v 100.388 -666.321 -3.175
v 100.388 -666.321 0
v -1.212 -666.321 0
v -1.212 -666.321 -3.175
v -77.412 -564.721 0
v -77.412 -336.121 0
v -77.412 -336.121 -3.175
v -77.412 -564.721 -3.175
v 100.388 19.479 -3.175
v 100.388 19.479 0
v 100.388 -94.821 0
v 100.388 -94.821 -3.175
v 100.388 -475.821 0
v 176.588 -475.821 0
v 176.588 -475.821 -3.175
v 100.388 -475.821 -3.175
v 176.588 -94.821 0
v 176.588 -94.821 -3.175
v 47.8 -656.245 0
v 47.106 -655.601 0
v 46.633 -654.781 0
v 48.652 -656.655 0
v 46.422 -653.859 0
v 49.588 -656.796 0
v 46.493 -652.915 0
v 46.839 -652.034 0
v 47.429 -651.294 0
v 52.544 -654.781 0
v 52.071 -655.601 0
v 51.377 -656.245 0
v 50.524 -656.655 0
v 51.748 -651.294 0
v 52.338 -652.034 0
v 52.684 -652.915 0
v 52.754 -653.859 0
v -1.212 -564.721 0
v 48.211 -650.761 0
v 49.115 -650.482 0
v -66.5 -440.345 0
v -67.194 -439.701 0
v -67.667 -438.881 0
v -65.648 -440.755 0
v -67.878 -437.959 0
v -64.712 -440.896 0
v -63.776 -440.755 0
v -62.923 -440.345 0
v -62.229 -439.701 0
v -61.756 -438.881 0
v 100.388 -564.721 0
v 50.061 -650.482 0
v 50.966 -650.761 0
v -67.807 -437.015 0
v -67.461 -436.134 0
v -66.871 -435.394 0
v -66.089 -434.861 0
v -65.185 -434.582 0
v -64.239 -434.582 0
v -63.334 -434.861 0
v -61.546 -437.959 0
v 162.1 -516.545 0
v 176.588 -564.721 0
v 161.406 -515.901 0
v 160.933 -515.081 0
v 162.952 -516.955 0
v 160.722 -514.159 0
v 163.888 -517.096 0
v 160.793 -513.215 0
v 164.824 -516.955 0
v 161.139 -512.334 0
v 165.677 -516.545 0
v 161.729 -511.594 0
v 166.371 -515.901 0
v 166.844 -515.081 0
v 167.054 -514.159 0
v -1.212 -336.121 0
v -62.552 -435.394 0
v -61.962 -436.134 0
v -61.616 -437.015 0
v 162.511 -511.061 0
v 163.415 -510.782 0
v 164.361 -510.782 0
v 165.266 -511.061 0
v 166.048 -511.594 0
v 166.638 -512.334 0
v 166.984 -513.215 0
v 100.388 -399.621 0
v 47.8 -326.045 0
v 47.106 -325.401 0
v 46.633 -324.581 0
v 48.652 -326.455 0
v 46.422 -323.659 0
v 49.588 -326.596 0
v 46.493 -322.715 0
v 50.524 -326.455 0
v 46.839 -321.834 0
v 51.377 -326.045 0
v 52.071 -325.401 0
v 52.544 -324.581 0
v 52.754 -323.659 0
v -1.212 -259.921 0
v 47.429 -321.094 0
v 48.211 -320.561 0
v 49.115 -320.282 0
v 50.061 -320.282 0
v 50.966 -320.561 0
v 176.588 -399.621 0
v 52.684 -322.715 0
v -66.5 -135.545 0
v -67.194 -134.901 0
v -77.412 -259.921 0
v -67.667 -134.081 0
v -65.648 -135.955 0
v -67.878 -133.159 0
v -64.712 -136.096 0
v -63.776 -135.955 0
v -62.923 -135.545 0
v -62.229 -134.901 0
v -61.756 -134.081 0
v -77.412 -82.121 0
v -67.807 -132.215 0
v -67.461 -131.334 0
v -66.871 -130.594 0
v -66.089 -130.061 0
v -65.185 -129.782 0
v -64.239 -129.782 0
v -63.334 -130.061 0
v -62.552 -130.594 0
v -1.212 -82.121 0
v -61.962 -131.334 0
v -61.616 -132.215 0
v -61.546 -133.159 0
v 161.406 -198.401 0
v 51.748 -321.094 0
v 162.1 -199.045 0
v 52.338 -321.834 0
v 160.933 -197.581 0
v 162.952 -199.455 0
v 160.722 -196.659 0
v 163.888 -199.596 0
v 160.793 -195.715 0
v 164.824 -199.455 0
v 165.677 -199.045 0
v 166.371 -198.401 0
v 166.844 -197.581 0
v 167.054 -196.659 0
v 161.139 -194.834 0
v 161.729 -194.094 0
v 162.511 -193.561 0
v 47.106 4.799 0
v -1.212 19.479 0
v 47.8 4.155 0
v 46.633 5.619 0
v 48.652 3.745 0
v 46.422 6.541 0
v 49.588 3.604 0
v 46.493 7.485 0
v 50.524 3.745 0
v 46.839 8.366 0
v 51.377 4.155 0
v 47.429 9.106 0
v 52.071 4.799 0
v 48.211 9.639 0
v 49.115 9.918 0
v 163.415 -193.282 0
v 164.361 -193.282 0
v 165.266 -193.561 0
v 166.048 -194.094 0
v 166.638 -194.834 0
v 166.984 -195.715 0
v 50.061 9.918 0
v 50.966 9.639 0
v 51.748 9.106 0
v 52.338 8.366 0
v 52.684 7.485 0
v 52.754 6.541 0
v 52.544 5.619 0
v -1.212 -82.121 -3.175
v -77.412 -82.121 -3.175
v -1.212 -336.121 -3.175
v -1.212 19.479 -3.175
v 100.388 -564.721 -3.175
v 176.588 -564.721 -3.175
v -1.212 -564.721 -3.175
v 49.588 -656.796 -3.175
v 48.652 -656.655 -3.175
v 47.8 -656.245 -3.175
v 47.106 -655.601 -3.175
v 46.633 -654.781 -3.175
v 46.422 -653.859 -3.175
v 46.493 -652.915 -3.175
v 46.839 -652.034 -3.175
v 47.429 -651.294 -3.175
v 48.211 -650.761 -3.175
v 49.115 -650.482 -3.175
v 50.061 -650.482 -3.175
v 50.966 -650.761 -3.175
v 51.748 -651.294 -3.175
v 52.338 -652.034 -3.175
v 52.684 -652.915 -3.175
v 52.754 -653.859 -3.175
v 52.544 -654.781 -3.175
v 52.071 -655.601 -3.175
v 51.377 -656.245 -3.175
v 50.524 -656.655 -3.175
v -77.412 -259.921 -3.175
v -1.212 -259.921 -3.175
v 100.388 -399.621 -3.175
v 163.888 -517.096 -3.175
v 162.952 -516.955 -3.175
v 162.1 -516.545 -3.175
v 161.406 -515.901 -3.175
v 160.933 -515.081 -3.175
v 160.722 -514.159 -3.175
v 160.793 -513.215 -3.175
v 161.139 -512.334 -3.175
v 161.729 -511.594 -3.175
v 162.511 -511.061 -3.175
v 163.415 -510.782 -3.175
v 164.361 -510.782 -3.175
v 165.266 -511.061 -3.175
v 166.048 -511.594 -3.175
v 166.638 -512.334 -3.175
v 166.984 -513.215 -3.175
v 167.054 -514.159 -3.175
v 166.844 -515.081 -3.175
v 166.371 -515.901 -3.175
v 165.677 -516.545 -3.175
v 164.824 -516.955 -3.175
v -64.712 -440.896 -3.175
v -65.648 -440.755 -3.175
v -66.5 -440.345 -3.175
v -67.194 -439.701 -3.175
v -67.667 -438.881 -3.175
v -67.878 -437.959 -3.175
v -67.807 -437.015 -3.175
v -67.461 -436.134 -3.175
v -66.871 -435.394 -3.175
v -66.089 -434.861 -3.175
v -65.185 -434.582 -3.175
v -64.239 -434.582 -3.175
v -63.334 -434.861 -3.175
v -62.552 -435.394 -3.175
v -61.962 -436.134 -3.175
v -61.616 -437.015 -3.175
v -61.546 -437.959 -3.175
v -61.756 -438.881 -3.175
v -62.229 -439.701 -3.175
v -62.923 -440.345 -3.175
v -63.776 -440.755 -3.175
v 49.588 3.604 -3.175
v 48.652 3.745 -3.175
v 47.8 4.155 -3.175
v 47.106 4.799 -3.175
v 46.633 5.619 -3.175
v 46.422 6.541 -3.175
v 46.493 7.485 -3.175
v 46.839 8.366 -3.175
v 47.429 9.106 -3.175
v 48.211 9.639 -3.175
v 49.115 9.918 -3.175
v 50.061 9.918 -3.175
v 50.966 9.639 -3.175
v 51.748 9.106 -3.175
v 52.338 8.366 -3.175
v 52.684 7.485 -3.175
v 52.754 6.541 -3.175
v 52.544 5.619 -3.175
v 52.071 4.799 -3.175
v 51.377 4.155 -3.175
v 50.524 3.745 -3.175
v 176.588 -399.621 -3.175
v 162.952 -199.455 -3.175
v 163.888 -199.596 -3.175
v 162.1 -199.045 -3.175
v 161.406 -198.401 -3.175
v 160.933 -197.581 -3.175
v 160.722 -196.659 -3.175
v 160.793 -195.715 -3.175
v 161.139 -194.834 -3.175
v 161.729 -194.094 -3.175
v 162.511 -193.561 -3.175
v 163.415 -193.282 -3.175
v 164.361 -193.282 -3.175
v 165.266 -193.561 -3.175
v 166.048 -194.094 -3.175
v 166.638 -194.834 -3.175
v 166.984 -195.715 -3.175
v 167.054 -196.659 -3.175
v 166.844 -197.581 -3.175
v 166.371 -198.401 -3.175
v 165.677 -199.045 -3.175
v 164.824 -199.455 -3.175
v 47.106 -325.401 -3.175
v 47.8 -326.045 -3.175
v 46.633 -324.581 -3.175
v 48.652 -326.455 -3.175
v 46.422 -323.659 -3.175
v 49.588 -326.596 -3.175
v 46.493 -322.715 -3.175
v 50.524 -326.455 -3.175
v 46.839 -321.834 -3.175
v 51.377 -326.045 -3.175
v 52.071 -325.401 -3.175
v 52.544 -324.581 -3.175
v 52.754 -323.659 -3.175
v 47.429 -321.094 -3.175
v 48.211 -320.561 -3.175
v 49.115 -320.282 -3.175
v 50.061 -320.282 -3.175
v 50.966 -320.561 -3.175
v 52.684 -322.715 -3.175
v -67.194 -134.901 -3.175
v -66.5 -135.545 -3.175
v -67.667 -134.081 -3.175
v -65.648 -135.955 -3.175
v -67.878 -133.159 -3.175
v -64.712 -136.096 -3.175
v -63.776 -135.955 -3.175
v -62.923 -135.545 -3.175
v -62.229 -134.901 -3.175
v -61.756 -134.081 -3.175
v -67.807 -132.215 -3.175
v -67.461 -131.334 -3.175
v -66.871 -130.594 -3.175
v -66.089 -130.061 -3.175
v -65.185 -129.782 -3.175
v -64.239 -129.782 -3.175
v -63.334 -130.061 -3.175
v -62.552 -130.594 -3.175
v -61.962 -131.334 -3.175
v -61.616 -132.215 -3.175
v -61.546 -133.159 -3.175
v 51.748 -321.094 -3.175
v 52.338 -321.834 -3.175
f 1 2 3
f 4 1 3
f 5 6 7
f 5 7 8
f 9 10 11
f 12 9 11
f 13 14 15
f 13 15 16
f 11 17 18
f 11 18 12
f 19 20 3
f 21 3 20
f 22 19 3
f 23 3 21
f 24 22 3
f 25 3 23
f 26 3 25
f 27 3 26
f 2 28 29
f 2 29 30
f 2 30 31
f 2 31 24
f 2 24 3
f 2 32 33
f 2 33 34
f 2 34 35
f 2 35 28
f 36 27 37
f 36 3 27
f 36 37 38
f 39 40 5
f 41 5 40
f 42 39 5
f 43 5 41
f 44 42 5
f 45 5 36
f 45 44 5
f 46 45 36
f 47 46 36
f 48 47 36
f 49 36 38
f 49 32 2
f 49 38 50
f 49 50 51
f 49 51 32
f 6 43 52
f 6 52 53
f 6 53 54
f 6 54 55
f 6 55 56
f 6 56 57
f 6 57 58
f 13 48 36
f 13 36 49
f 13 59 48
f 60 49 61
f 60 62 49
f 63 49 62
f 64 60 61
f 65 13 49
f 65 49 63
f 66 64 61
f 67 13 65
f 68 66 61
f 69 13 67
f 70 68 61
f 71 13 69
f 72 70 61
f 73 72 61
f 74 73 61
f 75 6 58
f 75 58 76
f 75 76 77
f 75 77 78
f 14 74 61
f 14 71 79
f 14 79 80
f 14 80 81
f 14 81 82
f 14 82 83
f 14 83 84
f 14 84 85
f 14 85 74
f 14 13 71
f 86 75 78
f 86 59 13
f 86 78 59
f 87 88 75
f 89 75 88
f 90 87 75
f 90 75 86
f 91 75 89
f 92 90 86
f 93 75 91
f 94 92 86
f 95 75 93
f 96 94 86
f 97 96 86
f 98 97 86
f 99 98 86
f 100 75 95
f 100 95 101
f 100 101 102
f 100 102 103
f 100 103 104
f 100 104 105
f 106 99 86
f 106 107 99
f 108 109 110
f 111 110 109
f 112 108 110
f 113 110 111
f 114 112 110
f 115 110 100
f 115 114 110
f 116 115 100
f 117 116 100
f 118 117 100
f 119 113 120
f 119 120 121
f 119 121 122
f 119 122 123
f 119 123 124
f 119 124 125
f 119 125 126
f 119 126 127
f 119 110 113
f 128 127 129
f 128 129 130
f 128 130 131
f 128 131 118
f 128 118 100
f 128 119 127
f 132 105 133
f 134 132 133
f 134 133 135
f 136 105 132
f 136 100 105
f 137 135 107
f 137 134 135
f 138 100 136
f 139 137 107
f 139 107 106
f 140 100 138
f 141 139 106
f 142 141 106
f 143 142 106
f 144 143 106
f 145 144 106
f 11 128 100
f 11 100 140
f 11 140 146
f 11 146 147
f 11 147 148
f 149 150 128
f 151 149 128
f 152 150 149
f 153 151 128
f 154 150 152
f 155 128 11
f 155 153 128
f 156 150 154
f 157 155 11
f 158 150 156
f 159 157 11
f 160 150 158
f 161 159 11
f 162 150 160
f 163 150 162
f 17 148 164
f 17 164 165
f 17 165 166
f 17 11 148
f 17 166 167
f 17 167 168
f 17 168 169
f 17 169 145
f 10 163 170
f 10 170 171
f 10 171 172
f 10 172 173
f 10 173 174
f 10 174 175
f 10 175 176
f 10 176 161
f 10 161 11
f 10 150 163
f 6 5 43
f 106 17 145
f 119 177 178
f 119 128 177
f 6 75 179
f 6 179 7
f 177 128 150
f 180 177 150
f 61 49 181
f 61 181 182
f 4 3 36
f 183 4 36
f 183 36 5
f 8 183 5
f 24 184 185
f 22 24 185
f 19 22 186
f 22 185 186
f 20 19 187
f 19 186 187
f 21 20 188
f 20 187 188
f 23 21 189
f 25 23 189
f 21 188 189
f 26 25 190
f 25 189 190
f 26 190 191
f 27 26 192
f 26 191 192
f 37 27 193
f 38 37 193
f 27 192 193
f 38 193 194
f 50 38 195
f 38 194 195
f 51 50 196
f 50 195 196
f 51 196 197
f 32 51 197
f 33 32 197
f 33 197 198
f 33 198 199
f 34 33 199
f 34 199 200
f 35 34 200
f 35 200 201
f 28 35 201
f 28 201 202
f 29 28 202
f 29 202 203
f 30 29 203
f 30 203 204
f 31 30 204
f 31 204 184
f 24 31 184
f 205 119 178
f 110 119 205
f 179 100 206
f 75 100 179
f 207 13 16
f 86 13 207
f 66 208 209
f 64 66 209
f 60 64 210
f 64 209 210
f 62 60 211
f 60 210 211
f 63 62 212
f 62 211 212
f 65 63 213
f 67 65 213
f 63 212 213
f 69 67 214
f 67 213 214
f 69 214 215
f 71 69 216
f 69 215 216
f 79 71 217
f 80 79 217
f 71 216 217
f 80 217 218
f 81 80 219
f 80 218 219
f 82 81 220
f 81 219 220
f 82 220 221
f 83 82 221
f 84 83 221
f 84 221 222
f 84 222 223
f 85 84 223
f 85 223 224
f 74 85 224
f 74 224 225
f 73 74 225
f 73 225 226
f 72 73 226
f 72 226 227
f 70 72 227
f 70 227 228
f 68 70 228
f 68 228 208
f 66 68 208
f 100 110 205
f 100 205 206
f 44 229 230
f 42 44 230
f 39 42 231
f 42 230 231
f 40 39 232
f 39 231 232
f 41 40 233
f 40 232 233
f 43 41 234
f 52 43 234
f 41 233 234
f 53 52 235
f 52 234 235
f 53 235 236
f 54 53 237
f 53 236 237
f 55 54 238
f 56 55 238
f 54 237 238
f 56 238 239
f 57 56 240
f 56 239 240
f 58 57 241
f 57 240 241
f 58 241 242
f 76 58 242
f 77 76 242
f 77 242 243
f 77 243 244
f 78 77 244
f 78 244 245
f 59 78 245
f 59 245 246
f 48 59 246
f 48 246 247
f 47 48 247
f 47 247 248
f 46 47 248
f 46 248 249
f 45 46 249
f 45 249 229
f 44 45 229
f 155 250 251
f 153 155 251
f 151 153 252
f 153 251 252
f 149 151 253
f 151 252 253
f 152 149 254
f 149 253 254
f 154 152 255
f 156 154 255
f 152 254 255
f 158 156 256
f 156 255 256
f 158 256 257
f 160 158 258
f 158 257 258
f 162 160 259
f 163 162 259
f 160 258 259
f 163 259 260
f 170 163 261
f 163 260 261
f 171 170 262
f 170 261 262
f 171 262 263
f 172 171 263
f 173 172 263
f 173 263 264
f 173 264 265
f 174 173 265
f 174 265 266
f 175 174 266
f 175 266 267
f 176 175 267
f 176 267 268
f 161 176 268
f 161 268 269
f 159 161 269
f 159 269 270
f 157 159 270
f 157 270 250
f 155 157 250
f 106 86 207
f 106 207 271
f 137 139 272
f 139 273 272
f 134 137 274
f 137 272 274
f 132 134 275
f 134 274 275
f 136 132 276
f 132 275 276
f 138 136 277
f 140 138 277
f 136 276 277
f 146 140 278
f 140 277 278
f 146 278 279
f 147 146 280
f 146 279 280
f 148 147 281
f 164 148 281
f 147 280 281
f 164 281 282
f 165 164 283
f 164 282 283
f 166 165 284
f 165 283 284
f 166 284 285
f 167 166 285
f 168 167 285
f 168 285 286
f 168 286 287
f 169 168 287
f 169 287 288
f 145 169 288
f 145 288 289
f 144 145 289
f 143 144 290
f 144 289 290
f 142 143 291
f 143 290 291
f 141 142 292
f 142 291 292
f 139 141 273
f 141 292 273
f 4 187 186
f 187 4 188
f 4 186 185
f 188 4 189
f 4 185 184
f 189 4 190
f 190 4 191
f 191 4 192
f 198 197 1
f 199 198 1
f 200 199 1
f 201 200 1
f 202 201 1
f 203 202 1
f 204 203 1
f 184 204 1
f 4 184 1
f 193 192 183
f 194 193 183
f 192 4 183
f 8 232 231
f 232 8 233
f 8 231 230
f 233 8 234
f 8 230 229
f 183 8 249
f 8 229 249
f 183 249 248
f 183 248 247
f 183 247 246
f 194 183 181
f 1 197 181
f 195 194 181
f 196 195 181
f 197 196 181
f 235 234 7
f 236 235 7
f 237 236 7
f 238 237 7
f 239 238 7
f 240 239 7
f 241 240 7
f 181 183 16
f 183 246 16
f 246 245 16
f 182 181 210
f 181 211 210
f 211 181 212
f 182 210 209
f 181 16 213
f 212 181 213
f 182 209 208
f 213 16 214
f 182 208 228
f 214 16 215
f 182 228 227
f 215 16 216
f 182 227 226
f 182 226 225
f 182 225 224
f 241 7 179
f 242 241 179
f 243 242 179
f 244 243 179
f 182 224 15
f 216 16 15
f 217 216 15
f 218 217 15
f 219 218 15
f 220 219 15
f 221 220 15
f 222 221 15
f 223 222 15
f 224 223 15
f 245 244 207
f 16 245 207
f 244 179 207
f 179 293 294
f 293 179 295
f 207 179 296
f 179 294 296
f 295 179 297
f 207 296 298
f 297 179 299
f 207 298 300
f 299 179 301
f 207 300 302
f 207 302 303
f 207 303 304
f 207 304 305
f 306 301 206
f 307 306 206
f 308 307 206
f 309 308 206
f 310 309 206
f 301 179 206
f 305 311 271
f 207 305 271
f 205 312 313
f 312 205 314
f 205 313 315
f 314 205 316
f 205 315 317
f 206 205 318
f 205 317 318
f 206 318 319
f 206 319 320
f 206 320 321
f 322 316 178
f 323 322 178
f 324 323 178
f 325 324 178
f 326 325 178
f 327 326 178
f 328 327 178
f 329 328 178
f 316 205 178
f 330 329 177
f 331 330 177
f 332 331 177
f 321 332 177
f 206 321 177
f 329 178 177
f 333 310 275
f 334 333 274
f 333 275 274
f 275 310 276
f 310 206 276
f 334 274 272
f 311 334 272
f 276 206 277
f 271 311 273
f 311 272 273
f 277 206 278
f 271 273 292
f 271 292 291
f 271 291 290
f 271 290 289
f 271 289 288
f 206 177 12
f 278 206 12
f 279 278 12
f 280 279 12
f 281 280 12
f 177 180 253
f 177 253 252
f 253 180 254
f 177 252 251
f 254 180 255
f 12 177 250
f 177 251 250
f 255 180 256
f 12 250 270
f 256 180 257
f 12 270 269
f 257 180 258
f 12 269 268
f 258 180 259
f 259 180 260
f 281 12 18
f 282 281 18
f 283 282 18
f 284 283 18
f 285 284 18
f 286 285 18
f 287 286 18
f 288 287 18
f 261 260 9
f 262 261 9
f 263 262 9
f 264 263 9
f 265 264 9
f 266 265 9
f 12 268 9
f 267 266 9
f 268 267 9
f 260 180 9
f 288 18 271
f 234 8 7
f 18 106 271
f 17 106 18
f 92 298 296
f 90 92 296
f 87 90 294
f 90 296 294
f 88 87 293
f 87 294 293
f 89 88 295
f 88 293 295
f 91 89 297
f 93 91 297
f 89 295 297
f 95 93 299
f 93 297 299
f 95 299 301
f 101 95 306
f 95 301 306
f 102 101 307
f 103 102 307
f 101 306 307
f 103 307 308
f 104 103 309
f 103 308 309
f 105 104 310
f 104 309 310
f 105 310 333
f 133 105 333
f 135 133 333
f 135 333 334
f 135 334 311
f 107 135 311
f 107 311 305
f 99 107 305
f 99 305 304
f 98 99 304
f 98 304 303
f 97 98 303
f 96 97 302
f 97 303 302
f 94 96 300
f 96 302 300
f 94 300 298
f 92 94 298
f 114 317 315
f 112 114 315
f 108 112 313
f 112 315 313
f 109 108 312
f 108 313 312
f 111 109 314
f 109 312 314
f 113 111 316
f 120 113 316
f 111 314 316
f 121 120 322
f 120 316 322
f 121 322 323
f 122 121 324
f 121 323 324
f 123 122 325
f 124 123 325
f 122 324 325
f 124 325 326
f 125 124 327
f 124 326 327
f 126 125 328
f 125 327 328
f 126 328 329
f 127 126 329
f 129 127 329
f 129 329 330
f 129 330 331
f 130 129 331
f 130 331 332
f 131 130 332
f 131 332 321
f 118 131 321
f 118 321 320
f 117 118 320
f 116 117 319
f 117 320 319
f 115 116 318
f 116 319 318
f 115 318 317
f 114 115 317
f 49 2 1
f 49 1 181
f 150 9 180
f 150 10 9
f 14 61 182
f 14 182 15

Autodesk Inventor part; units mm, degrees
ref_plane "YZ Plane" through (0, 0, 0) normal (1, 0, 0) x (0, 1, 0)
ref_plane "XZ Plane" through (0, 0, 0) normal (0, 1, 0) x (-1, 0, 0)
ref_plane "XY Plane" through (0, 0, 0) normal (0, 0, 1) x (1, 0, 0)
sketch "Sketch1" plane through (0, 0, 0) normal (0, 0, 1) x (1, 0, 0)
  line L0 (176.5882, -640.9214) -> (176.5882, 349.6786)
  line L1 (-77.4118, 349.6786) -> (-77.4118, -640.9214)
  line L2 (100.3882, -640.9214) -> (100.3882, -564.7214)
  line L3 (100.3882, -564.7214) -> (176.5882, -564.7214)
  line L4 (176.5882, -475.8214) -> (100.3882, -475.8214)
  line L5 (100.3882, -475.8214) -> (100.3882, -399.6214)
  line L6 (100.3882, -399.6214) -> (176.5882, -399.6214)
  line L7 (176.5882, -399.6214) -> (176.5882, -475.8214)
  line L8 (176.5882, -94.8214) -> (100.3882, -94.8214)
  line L9 (176.5882, 70.2786) -> (176.5882, -94.8214)
  line L10 (-77.4118, 8.6504) -> (-77.4118, 88.2844)
  line L11 (-77.4118, -379.8866) -> (-77.4118, -294.668)
  line L12 (-77.4118, -640.9214) -> (-1.2118, -640.9214)
  line L13 (-1.2118, -640.9214) -> (-1.2118, -564.7214)
  line L14 (-1.2118, -564.7214) -> (-77.4118, -564.7214)
  line L15 (-77.4118, -564.7214) -> (-77.4118, -640.9214)
  line L16 (-77.4118, -259.9214) -> (-1.2118, -259.9214)
  line L17 (-1.2118, -259.9214) -> (-1.2118, -336.1214)
  line L18 (-1.2118, -336.1214) -> (-77.4118, -336.1214)
  line L19 (-77.4118, -336.1214) -> (-77.4118, -259.9214)
  line L20 (-1.2118, -82.1214) -> (-1.2118, 19.4786)
  line L21 (-77.4118, 19.4786) -> (-77.4118, 19.4786)
  line L22 (100.3882, -640.9214) -> (100.3882, -666.3214)
  line L23 (100.3882, -666.3214) -> (-1.2118, -666.3214)
  line L24 (-1.2118, -666.3214) -> (-1.2118, -640.9214)
  line L25 (-1.2118, -82.1214) -> (-77.4118, -82.1214)
  line L26 (100.3882, 19.4786) -> (100.3882, -94.8214)
  line L27 (100.3882, 19.4786) -> (-1.2118, 19.4786)
  point P0 (0, 0)
  point P1 (49.5882, -323.4214)
  point P2 (-64.7118, -437.7214)
  point P3 (-64.7118, -132.9214)
  point P4 (163.8882, -196.4214)
  point P5 (163.8882, -513.9214)
  point P6 (49.5882, -653.6214)
  point P7 (49.5882, 6.7786)
  dimension "d1" = 990.6
  dimension "d2" = 76.2
  dimension "d3" = 76.2
  dimension "d4" = 76.2
  dimension "d5" = 76.2
  dimension "d6" = 88.9
  dimension "d7" = 304.8
  dimension "d14" = 76.2
  dimension "d15" = 76.2
  dimension "d16" = 76.2
  dimension "d17" = 76.2
  dimension "d18" = 63.5
  dimension "d19" = 101.6
  dimension "d20" = 76.2
  dimension "d29" = 12.7
  dimension "d30" = 12.7
  dimension "d31" = 127
  dimension "d32" = 101.6
  dimension "d33" = 12.7
  dimension "d34" = 12.7
  dimension "d35" = 101.6
  dimension "d36" = 38.1
  dimension "d37" = 25.4
  dimension "d38" = 101.6
  dimension "d49" = 101.6
  dimension "d50" = 114.3
  dimension "d51" = 76.2
  dimension "d52" = 76.2
extrude "Extrusion1" add sketch "Sketch1" against normal blind 3.175 contours L3 L2 L22 L23 L24 L13 L14 L1 L18 L17 L16 L25 L20 L27 L26 L8 L0 L6 L5 L4
hole "Hole1" at (49.5882, -323.4214, 0) at (-64.7118, -437.7214, 0) at (-64.7118, -132.9214, 0) at (163.8882, -196.4214, 0) at (163.8882, -513.9214, 0) at (49.5882, -653.6214, 0) at (49.5882, 6.7786, 0) direction (0, 0, -1) diameter 6.35 depth 25.4 tip angle 118
properties part number "medium tower walls"
